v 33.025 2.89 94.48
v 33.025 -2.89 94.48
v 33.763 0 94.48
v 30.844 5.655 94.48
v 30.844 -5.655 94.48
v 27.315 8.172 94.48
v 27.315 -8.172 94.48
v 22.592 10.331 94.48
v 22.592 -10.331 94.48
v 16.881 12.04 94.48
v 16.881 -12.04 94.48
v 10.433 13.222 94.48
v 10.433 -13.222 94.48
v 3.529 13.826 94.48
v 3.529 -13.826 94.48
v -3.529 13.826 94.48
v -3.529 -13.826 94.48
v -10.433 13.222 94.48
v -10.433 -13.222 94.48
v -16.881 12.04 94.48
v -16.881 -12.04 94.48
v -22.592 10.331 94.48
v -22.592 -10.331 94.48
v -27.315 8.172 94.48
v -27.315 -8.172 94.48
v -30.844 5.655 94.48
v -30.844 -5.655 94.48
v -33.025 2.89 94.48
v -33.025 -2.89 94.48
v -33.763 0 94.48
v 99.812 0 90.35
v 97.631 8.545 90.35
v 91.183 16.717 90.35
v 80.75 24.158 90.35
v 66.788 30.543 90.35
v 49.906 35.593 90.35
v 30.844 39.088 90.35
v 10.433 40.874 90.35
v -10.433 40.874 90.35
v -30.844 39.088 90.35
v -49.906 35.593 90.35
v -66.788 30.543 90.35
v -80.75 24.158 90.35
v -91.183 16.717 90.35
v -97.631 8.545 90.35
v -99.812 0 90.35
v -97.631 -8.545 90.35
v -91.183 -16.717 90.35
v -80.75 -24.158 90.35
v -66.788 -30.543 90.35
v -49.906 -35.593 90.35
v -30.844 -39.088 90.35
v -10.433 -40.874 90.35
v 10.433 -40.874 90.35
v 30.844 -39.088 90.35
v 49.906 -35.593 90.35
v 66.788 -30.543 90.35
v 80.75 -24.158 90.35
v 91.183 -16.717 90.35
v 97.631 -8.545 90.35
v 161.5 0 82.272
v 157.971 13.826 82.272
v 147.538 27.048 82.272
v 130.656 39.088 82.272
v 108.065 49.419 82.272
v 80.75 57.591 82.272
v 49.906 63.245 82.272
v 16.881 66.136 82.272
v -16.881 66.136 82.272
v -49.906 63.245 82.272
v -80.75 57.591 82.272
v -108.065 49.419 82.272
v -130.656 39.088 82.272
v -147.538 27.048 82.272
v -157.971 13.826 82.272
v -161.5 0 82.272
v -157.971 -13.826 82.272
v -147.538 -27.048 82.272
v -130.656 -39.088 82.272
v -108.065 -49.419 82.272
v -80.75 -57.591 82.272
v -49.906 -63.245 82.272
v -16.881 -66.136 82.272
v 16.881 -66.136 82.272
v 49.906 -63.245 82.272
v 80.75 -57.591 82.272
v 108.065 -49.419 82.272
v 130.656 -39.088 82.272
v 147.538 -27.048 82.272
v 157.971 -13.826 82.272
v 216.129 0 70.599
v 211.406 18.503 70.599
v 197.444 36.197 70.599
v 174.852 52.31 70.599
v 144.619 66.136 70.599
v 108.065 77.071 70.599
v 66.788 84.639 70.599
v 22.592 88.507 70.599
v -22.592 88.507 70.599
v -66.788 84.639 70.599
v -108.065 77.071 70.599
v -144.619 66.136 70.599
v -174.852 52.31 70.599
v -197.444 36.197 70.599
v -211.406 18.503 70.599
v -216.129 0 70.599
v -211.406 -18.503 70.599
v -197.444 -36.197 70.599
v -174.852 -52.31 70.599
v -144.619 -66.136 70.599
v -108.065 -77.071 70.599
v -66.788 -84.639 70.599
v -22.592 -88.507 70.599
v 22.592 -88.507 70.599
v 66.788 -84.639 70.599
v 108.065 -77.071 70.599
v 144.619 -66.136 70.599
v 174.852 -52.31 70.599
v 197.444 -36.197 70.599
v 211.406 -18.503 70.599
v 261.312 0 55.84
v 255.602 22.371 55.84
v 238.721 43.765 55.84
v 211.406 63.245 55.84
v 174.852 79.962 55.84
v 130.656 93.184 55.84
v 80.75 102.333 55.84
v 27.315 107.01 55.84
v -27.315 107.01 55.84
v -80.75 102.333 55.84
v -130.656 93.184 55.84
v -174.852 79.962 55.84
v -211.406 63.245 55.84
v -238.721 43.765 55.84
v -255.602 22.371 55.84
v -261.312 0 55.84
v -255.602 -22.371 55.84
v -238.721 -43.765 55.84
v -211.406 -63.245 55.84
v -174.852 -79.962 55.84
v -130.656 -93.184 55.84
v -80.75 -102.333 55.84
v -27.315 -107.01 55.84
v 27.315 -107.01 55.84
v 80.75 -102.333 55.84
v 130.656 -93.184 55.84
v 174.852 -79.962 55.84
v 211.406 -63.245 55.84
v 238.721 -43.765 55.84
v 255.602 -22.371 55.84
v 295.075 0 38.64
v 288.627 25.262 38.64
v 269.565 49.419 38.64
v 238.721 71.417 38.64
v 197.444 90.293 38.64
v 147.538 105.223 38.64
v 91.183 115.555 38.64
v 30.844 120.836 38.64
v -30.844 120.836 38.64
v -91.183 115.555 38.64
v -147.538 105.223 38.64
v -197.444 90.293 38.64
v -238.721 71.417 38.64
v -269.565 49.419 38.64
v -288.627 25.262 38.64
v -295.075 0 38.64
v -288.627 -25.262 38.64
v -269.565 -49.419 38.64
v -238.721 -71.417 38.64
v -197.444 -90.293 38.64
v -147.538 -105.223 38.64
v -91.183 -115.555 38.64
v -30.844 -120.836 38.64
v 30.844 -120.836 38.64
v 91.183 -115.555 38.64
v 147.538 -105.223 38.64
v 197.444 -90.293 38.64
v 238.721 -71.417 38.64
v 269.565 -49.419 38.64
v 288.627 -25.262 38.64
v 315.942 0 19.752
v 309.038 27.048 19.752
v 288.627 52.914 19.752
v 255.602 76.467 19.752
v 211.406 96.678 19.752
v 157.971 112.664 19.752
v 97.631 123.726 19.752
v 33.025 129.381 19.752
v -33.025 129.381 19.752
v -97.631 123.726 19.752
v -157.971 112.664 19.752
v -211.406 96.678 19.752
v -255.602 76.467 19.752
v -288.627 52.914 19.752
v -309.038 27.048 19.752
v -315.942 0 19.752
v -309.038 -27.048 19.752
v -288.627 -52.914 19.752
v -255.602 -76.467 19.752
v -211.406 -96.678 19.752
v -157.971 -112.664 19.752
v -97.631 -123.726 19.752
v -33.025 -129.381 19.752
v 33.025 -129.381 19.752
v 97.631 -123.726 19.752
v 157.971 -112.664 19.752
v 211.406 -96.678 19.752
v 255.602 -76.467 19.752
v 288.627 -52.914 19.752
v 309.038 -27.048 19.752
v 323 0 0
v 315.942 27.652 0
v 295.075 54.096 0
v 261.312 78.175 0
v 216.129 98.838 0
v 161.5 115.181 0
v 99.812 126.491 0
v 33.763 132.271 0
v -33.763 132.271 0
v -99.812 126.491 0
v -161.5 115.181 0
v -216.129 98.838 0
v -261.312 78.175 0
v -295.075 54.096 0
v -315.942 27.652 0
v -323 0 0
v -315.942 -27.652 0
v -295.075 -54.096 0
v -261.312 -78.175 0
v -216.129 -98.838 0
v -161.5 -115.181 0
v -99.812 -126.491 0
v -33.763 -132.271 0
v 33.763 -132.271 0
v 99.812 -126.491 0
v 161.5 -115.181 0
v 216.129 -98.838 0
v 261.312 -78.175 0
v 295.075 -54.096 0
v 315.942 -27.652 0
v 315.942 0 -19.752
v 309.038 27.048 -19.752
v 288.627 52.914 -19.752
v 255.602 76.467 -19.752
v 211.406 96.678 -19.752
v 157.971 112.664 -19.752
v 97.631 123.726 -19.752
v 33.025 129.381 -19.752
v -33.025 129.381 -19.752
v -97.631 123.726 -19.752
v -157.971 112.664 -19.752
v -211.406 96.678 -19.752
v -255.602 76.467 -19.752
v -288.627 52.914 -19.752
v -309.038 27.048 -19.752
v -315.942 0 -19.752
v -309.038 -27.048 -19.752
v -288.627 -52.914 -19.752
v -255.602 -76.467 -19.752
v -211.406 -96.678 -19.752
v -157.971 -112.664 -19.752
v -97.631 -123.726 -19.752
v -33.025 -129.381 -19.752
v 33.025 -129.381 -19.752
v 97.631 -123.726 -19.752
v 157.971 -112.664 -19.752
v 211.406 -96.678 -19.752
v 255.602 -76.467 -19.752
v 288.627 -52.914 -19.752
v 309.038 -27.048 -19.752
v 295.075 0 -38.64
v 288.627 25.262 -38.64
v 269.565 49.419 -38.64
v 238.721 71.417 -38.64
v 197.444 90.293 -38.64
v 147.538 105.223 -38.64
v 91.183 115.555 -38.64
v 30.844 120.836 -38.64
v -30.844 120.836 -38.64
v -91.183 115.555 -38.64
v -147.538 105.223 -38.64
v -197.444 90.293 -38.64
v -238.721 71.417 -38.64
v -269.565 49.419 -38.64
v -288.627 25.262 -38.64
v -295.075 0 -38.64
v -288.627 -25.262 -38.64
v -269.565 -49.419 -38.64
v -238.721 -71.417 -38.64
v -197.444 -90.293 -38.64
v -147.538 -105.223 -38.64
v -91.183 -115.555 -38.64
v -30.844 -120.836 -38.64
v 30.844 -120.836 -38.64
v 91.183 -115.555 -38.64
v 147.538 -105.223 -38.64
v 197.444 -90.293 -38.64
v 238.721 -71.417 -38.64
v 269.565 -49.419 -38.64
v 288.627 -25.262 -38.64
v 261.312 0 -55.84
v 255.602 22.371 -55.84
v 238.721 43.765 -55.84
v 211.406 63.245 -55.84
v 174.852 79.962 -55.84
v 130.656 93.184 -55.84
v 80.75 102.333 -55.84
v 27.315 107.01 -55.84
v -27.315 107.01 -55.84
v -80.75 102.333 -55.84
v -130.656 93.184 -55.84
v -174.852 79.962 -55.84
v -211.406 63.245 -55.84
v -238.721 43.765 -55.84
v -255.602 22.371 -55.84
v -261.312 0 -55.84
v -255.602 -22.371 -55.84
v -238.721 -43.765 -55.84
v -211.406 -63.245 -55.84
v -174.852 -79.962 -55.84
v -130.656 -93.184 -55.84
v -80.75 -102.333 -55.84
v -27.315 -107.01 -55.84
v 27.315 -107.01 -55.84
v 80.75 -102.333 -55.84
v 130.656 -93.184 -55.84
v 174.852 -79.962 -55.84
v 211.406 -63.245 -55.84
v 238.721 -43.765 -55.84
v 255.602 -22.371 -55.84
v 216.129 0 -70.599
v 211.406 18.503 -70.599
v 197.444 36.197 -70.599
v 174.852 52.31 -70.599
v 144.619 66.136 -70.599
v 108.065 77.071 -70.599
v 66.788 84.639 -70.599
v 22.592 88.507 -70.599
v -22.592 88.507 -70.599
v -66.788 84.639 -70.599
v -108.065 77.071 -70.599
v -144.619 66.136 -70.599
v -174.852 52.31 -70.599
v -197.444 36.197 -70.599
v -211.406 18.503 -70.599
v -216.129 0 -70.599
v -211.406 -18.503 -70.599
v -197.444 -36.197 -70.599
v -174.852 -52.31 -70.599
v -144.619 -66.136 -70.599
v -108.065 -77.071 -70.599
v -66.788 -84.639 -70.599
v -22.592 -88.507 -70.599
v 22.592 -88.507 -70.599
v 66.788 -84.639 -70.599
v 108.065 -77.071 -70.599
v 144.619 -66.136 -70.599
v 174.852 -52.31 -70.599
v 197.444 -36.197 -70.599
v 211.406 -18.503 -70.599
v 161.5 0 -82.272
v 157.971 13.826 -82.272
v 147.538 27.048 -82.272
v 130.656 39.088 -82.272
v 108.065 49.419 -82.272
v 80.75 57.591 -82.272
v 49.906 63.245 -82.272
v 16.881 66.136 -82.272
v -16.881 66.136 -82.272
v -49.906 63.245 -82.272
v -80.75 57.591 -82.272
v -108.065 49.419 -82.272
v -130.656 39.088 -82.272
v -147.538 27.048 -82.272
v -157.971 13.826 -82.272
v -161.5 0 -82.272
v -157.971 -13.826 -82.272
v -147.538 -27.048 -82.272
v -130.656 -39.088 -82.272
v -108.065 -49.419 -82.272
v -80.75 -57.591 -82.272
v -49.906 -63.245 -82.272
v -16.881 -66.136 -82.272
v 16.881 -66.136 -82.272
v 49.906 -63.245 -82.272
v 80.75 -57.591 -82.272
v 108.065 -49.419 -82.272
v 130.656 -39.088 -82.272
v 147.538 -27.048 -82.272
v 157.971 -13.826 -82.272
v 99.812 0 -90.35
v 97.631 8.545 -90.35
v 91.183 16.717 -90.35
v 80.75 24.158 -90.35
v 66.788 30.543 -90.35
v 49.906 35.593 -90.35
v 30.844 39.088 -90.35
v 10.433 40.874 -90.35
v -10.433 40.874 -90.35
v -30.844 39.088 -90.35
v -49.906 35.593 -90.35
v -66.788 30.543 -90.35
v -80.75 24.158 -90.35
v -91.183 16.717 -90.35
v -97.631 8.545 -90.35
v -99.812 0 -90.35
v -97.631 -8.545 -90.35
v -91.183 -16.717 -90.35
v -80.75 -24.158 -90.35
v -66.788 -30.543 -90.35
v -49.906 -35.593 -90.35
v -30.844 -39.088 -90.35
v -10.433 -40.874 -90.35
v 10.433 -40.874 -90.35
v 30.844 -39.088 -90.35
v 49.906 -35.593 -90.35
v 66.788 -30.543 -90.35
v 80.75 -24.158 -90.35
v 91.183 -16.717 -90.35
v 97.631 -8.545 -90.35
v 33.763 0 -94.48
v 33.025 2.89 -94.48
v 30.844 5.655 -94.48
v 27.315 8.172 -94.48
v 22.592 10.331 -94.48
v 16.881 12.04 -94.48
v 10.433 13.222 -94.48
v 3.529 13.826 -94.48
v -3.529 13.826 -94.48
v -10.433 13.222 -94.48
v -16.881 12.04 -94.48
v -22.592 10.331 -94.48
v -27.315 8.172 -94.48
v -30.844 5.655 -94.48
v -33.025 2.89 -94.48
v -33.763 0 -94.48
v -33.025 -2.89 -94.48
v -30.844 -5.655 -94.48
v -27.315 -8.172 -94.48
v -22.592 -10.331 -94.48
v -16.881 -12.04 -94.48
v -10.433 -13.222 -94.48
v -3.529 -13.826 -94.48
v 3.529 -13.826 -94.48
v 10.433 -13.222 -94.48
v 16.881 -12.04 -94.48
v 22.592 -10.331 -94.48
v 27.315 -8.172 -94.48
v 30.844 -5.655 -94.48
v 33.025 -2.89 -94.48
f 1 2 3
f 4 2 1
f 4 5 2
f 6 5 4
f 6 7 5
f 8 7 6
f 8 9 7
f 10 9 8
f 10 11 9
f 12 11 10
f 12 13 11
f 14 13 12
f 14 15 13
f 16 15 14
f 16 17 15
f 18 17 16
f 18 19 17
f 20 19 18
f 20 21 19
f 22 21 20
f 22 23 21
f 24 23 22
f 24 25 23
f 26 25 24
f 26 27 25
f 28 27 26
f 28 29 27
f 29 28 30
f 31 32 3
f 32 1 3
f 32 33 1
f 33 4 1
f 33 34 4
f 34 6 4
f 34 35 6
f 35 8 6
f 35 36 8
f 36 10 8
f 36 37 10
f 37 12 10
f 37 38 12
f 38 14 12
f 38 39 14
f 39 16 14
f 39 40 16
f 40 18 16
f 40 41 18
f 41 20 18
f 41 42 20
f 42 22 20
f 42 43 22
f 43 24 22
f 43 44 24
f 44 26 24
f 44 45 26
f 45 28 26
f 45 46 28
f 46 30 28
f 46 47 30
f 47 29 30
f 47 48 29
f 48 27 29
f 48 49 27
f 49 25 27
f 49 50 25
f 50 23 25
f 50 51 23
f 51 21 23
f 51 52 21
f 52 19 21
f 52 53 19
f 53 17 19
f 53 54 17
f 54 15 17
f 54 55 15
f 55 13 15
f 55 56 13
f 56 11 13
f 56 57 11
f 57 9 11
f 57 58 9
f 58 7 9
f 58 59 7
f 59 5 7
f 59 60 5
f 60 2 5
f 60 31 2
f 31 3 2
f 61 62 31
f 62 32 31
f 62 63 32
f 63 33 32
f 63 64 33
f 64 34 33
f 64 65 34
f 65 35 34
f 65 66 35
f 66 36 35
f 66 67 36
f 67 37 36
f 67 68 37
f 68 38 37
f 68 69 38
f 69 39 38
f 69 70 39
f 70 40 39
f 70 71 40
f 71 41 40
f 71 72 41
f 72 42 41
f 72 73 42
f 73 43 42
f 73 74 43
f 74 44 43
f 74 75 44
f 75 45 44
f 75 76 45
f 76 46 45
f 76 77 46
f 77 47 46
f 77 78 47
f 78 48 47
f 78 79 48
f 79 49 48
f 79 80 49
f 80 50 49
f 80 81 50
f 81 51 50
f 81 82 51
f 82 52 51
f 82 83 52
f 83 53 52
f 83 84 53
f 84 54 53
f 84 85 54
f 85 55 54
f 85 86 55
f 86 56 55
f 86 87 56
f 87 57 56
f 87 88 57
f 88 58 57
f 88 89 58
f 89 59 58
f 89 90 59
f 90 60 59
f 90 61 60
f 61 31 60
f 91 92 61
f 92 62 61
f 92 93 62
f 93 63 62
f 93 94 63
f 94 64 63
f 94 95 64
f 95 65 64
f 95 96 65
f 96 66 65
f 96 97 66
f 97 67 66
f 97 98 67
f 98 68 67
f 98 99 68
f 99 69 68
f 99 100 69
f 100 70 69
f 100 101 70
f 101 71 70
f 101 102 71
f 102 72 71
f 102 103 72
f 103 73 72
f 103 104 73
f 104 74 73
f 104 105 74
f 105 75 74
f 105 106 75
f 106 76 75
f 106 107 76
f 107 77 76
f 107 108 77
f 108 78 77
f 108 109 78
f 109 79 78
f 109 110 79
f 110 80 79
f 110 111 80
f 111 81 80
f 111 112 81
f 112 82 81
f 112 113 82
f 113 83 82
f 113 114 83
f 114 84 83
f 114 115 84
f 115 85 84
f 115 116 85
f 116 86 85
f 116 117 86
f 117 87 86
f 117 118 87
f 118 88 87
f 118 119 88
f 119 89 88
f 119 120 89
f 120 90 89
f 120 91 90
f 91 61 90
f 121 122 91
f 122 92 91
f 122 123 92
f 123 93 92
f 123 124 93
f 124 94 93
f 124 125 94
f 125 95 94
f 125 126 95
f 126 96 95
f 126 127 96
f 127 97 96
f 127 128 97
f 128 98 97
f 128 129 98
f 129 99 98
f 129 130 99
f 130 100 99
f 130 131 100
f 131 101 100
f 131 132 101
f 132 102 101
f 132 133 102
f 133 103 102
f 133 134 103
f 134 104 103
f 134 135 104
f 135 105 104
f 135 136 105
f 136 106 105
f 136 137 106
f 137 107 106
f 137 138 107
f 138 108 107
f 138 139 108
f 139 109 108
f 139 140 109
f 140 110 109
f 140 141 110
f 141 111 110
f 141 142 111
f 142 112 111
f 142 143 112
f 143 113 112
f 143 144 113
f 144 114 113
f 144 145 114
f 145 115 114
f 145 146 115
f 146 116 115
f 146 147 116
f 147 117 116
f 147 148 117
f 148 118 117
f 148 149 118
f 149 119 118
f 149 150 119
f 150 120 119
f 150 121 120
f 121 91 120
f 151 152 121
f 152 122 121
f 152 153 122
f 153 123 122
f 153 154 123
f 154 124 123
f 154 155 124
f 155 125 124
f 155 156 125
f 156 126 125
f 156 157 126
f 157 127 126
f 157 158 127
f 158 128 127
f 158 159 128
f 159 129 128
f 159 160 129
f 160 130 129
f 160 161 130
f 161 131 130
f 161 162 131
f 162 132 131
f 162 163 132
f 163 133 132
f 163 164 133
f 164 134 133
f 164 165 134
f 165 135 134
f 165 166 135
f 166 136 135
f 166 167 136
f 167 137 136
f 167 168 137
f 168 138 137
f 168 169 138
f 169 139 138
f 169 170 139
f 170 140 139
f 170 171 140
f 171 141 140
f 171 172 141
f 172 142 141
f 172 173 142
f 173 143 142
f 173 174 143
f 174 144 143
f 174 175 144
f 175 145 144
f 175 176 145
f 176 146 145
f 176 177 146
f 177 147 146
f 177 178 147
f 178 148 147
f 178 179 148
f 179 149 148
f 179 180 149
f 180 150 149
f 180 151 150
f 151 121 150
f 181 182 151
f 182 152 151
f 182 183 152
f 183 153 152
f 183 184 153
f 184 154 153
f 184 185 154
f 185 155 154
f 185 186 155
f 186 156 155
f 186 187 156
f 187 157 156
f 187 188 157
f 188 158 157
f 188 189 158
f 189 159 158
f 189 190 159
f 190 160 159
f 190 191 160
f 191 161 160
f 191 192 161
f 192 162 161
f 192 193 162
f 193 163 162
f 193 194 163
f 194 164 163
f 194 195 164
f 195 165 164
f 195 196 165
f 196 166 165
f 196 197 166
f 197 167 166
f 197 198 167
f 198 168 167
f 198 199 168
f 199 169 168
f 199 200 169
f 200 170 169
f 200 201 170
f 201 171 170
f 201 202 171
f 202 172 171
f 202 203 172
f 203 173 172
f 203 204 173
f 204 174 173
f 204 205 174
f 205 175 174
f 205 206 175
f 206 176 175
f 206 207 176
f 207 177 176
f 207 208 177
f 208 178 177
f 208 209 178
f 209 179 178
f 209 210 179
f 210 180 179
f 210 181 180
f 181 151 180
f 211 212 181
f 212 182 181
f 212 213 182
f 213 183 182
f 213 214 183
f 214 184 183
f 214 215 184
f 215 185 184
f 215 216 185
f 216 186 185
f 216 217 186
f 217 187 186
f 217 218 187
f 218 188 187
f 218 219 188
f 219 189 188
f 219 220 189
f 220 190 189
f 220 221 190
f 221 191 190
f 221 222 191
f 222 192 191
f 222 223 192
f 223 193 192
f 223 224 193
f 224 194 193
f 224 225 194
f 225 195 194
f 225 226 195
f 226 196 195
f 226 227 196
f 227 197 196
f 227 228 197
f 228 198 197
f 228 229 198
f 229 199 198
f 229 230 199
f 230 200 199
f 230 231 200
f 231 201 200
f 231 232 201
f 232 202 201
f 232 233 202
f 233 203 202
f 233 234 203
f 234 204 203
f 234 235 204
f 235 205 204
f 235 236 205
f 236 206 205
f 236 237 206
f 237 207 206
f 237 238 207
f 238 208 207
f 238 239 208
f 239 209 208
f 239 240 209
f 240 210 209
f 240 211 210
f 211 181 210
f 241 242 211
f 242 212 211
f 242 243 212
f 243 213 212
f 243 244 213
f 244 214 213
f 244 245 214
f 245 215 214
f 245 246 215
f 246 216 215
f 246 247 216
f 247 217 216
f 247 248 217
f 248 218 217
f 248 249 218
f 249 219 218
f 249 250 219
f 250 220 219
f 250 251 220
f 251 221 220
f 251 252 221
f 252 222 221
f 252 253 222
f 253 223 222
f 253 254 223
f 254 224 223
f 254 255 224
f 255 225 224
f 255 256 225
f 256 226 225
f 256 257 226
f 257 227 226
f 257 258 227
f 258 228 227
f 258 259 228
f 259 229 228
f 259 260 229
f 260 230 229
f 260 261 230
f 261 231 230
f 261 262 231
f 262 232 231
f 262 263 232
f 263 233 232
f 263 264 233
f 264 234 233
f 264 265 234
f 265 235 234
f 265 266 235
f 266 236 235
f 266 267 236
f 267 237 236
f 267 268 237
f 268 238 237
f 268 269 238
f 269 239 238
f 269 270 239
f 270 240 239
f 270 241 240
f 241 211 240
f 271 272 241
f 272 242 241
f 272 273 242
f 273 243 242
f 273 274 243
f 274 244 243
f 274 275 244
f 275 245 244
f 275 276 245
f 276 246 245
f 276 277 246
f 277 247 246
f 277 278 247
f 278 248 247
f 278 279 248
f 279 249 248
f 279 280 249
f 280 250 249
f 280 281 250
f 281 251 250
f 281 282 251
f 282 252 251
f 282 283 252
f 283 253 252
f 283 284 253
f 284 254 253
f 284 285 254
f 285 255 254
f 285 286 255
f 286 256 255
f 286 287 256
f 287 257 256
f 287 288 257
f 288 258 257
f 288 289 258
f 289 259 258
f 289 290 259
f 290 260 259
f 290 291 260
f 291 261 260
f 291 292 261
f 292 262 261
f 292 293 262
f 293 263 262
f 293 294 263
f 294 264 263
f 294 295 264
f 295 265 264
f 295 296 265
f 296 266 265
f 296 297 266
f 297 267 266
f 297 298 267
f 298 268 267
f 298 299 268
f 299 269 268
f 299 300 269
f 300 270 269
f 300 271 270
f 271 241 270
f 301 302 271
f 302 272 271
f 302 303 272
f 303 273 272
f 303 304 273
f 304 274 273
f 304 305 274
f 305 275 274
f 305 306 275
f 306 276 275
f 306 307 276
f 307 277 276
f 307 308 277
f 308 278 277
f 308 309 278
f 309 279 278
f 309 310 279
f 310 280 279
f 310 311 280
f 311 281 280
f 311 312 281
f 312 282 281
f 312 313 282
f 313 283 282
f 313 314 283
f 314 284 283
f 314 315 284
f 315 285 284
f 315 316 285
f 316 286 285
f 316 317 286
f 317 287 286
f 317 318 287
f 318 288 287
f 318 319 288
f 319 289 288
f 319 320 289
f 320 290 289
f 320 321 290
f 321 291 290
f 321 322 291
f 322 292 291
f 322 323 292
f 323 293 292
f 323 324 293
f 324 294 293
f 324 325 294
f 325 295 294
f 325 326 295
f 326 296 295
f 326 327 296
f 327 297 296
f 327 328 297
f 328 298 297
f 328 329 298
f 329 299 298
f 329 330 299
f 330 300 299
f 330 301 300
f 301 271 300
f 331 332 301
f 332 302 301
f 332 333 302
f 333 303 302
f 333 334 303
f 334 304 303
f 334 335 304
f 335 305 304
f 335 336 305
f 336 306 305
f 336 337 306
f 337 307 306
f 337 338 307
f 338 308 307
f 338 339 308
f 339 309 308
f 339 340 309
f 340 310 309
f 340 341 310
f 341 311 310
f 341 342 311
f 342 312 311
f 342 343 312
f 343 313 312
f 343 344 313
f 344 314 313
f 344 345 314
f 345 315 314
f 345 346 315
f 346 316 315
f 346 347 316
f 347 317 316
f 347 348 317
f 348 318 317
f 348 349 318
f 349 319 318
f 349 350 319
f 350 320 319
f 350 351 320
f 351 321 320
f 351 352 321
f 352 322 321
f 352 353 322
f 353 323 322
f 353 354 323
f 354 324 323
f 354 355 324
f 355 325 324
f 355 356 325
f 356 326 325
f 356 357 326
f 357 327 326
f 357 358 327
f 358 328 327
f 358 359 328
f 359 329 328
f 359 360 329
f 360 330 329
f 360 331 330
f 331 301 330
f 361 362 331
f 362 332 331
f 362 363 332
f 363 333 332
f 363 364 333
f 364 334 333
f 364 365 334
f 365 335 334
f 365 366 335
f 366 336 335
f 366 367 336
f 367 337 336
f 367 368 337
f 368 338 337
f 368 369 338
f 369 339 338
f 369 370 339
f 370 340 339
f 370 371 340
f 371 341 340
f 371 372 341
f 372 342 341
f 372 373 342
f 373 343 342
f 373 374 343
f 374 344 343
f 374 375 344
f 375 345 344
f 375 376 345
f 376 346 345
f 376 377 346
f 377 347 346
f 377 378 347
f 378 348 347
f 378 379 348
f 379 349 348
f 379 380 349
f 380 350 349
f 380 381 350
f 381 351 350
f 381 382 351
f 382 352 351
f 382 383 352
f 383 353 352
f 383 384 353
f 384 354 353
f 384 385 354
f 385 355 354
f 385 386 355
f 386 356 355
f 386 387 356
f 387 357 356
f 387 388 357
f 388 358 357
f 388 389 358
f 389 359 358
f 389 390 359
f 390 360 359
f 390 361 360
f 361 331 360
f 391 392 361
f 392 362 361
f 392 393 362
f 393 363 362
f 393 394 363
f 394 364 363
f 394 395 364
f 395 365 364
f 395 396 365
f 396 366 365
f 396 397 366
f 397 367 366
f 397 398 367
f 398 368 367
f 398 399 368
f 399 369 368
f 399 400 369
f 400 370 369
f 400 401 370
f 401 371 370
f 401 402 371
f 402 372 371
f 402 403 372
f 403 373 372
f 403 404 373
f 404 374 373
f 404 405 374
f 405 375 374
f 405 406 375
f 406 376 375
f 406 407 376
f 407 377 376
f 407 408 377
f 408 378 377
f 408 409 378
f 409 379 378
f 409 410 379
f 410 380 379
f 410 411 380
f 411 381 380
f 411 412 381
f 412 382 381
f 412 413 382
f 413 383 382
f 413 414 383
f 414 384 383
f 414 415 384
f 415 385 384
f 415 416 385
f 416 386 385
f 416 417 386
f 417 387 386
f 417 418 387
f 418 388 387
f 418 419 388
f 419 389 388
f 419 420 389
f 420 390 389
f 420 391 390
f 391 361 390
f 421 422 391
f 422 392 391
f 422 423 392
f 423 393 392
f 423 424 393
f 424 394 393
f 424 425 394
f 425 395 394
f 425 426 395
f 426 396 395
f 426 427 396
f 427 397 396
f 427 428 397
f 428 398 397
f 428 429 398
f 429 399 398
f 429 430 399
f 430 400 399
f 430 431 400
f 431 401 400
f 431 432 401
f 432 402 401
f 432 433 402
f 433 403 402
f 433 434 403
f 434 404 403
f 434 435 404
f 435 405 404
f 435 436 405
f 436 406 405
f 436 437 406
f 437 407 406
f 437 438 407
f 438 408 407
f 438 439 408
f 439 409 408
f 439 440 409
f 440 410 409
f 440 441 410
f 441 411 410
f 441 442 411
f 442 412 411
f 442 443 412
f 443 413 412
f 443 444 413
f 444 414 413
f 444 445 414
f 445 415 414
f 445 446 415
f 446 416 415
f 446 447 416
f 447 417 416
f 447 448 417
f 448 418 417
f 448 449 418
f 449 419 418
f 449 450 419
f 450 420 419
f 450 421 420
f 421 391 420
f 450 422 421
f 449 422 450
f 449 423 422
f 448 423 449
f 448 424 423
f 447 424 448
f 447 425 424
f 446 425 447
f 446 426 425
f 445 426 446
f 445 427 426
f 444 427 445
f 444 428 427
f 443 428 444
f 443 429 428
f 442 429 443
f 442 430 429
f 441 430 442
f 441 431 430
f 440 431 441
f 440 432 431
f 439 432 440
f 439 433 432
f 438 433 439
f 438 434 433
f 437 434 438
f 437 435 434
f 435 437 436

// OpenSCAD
// Generated by SolidPython 1.0.1 on 2020-07-29 00:46:52


scale(v = [17, 7, 5]) {
	sphere(r = 19);
}
/***********************************************
*********      SolidPython code:      **********
************************************************
 
# import packages: SolidPython
from solid import *
from solid.utils import *
from itertools import chain, combinations, permutations


class Resize:

    def __init__(self, scad_file):
        self.scad_file = scad_file
        #self.scad_file = import_scad(scad_file)
        # cone/cylinder param:
        self.r1 = 0
        self.r2 = 0
        self.h = 0
        # rectangular prism param:
        self.w = 0
        self.l = 0
        # ellipse param:
        self.r = 0

    # import OpenScad code (file name corresponds to shape)


    # classify shape + parameters
    def assign(self, param1, param2, param3):
        if self.scad_file == 'cone.scad':
            self.r1 = param1
            self.r2 = param2
            self.h = param3
        elif self.scad_file == 'cylinder.scad':
            self.r1 = param1
            self.r2 = param2
            self.h = param3
        elif self.scad_file == 'rectangularPrism.scad':
            self.h = param1
            self.l = param2
            self.w = param3
        else:
            self.r = param1
            self.h = param2

    # resize parameters
    def iterate(self):
        x = range(3, 20, 2)
        i = 1
        if self.scad_file == 'cone.scad':
            tempList = list(permutations(x, 2))
            for temp in tempList:
                param1 = temp[0]
                param2 = temp[1]
                filepath = 'produced_scad_files/' + 'cone' + str(param1) + '_' + str(param2) + '_' + '.scad'
                scad_render_to_file(cylinder(h=param1, r1=param2, r2=0), filepath)

        elif self.scad_file == 'cylinder.scad':
            tempList = list(permutations(x, 3))
            for temp in tempList:
                param1 = temp[0]
                param2 = temp[1]
                filepath = 'produced_scad_files/' + 'cylinder' + str(param1) + '_' + str(param2) + '_' + '.scad'
                scad_render_to_file(cylinder(h=param1, r1=param2, r2=param2), filepath)

        elif self.scad_file == 'rectangularPrism.scad':
            tempList = list(permutations(x, 3))
            for temp in tempList:
                param1 = temp[0]
                param2 = temp[1]
                param3 = temp[2]
                filepath = 'produced_scad_files/' + 'rectangularPrism' + str(param1) + '_' + str(param2) + '_' + str(
                    param3) + '.scad'
                scad_render_to_file(cube(size=(param1, param2, param3)), filepath)

        elif self.scad_file == 'ellipse.scad':
            tempList = list(permutations(x, 4))
            for temp in tempList:
                param1 = temp[0]
                param2 = temp[1]
                param3 = temp[2]
                param4 = temp[3]
                filepath = 'produced_scad_files/' + 'ellipse' + str(param1) + '_' + str(param2) + '_' + str(param3) + '_' + str(param4) + '.scad'
                scad_render_to_file(scale([param1, param2, param3])(sphere(r=param4)), filepath)

    def render_to_scadfile(self):
        scad_render_to_file(scad, 'example.scad') 
 
************************************************/
